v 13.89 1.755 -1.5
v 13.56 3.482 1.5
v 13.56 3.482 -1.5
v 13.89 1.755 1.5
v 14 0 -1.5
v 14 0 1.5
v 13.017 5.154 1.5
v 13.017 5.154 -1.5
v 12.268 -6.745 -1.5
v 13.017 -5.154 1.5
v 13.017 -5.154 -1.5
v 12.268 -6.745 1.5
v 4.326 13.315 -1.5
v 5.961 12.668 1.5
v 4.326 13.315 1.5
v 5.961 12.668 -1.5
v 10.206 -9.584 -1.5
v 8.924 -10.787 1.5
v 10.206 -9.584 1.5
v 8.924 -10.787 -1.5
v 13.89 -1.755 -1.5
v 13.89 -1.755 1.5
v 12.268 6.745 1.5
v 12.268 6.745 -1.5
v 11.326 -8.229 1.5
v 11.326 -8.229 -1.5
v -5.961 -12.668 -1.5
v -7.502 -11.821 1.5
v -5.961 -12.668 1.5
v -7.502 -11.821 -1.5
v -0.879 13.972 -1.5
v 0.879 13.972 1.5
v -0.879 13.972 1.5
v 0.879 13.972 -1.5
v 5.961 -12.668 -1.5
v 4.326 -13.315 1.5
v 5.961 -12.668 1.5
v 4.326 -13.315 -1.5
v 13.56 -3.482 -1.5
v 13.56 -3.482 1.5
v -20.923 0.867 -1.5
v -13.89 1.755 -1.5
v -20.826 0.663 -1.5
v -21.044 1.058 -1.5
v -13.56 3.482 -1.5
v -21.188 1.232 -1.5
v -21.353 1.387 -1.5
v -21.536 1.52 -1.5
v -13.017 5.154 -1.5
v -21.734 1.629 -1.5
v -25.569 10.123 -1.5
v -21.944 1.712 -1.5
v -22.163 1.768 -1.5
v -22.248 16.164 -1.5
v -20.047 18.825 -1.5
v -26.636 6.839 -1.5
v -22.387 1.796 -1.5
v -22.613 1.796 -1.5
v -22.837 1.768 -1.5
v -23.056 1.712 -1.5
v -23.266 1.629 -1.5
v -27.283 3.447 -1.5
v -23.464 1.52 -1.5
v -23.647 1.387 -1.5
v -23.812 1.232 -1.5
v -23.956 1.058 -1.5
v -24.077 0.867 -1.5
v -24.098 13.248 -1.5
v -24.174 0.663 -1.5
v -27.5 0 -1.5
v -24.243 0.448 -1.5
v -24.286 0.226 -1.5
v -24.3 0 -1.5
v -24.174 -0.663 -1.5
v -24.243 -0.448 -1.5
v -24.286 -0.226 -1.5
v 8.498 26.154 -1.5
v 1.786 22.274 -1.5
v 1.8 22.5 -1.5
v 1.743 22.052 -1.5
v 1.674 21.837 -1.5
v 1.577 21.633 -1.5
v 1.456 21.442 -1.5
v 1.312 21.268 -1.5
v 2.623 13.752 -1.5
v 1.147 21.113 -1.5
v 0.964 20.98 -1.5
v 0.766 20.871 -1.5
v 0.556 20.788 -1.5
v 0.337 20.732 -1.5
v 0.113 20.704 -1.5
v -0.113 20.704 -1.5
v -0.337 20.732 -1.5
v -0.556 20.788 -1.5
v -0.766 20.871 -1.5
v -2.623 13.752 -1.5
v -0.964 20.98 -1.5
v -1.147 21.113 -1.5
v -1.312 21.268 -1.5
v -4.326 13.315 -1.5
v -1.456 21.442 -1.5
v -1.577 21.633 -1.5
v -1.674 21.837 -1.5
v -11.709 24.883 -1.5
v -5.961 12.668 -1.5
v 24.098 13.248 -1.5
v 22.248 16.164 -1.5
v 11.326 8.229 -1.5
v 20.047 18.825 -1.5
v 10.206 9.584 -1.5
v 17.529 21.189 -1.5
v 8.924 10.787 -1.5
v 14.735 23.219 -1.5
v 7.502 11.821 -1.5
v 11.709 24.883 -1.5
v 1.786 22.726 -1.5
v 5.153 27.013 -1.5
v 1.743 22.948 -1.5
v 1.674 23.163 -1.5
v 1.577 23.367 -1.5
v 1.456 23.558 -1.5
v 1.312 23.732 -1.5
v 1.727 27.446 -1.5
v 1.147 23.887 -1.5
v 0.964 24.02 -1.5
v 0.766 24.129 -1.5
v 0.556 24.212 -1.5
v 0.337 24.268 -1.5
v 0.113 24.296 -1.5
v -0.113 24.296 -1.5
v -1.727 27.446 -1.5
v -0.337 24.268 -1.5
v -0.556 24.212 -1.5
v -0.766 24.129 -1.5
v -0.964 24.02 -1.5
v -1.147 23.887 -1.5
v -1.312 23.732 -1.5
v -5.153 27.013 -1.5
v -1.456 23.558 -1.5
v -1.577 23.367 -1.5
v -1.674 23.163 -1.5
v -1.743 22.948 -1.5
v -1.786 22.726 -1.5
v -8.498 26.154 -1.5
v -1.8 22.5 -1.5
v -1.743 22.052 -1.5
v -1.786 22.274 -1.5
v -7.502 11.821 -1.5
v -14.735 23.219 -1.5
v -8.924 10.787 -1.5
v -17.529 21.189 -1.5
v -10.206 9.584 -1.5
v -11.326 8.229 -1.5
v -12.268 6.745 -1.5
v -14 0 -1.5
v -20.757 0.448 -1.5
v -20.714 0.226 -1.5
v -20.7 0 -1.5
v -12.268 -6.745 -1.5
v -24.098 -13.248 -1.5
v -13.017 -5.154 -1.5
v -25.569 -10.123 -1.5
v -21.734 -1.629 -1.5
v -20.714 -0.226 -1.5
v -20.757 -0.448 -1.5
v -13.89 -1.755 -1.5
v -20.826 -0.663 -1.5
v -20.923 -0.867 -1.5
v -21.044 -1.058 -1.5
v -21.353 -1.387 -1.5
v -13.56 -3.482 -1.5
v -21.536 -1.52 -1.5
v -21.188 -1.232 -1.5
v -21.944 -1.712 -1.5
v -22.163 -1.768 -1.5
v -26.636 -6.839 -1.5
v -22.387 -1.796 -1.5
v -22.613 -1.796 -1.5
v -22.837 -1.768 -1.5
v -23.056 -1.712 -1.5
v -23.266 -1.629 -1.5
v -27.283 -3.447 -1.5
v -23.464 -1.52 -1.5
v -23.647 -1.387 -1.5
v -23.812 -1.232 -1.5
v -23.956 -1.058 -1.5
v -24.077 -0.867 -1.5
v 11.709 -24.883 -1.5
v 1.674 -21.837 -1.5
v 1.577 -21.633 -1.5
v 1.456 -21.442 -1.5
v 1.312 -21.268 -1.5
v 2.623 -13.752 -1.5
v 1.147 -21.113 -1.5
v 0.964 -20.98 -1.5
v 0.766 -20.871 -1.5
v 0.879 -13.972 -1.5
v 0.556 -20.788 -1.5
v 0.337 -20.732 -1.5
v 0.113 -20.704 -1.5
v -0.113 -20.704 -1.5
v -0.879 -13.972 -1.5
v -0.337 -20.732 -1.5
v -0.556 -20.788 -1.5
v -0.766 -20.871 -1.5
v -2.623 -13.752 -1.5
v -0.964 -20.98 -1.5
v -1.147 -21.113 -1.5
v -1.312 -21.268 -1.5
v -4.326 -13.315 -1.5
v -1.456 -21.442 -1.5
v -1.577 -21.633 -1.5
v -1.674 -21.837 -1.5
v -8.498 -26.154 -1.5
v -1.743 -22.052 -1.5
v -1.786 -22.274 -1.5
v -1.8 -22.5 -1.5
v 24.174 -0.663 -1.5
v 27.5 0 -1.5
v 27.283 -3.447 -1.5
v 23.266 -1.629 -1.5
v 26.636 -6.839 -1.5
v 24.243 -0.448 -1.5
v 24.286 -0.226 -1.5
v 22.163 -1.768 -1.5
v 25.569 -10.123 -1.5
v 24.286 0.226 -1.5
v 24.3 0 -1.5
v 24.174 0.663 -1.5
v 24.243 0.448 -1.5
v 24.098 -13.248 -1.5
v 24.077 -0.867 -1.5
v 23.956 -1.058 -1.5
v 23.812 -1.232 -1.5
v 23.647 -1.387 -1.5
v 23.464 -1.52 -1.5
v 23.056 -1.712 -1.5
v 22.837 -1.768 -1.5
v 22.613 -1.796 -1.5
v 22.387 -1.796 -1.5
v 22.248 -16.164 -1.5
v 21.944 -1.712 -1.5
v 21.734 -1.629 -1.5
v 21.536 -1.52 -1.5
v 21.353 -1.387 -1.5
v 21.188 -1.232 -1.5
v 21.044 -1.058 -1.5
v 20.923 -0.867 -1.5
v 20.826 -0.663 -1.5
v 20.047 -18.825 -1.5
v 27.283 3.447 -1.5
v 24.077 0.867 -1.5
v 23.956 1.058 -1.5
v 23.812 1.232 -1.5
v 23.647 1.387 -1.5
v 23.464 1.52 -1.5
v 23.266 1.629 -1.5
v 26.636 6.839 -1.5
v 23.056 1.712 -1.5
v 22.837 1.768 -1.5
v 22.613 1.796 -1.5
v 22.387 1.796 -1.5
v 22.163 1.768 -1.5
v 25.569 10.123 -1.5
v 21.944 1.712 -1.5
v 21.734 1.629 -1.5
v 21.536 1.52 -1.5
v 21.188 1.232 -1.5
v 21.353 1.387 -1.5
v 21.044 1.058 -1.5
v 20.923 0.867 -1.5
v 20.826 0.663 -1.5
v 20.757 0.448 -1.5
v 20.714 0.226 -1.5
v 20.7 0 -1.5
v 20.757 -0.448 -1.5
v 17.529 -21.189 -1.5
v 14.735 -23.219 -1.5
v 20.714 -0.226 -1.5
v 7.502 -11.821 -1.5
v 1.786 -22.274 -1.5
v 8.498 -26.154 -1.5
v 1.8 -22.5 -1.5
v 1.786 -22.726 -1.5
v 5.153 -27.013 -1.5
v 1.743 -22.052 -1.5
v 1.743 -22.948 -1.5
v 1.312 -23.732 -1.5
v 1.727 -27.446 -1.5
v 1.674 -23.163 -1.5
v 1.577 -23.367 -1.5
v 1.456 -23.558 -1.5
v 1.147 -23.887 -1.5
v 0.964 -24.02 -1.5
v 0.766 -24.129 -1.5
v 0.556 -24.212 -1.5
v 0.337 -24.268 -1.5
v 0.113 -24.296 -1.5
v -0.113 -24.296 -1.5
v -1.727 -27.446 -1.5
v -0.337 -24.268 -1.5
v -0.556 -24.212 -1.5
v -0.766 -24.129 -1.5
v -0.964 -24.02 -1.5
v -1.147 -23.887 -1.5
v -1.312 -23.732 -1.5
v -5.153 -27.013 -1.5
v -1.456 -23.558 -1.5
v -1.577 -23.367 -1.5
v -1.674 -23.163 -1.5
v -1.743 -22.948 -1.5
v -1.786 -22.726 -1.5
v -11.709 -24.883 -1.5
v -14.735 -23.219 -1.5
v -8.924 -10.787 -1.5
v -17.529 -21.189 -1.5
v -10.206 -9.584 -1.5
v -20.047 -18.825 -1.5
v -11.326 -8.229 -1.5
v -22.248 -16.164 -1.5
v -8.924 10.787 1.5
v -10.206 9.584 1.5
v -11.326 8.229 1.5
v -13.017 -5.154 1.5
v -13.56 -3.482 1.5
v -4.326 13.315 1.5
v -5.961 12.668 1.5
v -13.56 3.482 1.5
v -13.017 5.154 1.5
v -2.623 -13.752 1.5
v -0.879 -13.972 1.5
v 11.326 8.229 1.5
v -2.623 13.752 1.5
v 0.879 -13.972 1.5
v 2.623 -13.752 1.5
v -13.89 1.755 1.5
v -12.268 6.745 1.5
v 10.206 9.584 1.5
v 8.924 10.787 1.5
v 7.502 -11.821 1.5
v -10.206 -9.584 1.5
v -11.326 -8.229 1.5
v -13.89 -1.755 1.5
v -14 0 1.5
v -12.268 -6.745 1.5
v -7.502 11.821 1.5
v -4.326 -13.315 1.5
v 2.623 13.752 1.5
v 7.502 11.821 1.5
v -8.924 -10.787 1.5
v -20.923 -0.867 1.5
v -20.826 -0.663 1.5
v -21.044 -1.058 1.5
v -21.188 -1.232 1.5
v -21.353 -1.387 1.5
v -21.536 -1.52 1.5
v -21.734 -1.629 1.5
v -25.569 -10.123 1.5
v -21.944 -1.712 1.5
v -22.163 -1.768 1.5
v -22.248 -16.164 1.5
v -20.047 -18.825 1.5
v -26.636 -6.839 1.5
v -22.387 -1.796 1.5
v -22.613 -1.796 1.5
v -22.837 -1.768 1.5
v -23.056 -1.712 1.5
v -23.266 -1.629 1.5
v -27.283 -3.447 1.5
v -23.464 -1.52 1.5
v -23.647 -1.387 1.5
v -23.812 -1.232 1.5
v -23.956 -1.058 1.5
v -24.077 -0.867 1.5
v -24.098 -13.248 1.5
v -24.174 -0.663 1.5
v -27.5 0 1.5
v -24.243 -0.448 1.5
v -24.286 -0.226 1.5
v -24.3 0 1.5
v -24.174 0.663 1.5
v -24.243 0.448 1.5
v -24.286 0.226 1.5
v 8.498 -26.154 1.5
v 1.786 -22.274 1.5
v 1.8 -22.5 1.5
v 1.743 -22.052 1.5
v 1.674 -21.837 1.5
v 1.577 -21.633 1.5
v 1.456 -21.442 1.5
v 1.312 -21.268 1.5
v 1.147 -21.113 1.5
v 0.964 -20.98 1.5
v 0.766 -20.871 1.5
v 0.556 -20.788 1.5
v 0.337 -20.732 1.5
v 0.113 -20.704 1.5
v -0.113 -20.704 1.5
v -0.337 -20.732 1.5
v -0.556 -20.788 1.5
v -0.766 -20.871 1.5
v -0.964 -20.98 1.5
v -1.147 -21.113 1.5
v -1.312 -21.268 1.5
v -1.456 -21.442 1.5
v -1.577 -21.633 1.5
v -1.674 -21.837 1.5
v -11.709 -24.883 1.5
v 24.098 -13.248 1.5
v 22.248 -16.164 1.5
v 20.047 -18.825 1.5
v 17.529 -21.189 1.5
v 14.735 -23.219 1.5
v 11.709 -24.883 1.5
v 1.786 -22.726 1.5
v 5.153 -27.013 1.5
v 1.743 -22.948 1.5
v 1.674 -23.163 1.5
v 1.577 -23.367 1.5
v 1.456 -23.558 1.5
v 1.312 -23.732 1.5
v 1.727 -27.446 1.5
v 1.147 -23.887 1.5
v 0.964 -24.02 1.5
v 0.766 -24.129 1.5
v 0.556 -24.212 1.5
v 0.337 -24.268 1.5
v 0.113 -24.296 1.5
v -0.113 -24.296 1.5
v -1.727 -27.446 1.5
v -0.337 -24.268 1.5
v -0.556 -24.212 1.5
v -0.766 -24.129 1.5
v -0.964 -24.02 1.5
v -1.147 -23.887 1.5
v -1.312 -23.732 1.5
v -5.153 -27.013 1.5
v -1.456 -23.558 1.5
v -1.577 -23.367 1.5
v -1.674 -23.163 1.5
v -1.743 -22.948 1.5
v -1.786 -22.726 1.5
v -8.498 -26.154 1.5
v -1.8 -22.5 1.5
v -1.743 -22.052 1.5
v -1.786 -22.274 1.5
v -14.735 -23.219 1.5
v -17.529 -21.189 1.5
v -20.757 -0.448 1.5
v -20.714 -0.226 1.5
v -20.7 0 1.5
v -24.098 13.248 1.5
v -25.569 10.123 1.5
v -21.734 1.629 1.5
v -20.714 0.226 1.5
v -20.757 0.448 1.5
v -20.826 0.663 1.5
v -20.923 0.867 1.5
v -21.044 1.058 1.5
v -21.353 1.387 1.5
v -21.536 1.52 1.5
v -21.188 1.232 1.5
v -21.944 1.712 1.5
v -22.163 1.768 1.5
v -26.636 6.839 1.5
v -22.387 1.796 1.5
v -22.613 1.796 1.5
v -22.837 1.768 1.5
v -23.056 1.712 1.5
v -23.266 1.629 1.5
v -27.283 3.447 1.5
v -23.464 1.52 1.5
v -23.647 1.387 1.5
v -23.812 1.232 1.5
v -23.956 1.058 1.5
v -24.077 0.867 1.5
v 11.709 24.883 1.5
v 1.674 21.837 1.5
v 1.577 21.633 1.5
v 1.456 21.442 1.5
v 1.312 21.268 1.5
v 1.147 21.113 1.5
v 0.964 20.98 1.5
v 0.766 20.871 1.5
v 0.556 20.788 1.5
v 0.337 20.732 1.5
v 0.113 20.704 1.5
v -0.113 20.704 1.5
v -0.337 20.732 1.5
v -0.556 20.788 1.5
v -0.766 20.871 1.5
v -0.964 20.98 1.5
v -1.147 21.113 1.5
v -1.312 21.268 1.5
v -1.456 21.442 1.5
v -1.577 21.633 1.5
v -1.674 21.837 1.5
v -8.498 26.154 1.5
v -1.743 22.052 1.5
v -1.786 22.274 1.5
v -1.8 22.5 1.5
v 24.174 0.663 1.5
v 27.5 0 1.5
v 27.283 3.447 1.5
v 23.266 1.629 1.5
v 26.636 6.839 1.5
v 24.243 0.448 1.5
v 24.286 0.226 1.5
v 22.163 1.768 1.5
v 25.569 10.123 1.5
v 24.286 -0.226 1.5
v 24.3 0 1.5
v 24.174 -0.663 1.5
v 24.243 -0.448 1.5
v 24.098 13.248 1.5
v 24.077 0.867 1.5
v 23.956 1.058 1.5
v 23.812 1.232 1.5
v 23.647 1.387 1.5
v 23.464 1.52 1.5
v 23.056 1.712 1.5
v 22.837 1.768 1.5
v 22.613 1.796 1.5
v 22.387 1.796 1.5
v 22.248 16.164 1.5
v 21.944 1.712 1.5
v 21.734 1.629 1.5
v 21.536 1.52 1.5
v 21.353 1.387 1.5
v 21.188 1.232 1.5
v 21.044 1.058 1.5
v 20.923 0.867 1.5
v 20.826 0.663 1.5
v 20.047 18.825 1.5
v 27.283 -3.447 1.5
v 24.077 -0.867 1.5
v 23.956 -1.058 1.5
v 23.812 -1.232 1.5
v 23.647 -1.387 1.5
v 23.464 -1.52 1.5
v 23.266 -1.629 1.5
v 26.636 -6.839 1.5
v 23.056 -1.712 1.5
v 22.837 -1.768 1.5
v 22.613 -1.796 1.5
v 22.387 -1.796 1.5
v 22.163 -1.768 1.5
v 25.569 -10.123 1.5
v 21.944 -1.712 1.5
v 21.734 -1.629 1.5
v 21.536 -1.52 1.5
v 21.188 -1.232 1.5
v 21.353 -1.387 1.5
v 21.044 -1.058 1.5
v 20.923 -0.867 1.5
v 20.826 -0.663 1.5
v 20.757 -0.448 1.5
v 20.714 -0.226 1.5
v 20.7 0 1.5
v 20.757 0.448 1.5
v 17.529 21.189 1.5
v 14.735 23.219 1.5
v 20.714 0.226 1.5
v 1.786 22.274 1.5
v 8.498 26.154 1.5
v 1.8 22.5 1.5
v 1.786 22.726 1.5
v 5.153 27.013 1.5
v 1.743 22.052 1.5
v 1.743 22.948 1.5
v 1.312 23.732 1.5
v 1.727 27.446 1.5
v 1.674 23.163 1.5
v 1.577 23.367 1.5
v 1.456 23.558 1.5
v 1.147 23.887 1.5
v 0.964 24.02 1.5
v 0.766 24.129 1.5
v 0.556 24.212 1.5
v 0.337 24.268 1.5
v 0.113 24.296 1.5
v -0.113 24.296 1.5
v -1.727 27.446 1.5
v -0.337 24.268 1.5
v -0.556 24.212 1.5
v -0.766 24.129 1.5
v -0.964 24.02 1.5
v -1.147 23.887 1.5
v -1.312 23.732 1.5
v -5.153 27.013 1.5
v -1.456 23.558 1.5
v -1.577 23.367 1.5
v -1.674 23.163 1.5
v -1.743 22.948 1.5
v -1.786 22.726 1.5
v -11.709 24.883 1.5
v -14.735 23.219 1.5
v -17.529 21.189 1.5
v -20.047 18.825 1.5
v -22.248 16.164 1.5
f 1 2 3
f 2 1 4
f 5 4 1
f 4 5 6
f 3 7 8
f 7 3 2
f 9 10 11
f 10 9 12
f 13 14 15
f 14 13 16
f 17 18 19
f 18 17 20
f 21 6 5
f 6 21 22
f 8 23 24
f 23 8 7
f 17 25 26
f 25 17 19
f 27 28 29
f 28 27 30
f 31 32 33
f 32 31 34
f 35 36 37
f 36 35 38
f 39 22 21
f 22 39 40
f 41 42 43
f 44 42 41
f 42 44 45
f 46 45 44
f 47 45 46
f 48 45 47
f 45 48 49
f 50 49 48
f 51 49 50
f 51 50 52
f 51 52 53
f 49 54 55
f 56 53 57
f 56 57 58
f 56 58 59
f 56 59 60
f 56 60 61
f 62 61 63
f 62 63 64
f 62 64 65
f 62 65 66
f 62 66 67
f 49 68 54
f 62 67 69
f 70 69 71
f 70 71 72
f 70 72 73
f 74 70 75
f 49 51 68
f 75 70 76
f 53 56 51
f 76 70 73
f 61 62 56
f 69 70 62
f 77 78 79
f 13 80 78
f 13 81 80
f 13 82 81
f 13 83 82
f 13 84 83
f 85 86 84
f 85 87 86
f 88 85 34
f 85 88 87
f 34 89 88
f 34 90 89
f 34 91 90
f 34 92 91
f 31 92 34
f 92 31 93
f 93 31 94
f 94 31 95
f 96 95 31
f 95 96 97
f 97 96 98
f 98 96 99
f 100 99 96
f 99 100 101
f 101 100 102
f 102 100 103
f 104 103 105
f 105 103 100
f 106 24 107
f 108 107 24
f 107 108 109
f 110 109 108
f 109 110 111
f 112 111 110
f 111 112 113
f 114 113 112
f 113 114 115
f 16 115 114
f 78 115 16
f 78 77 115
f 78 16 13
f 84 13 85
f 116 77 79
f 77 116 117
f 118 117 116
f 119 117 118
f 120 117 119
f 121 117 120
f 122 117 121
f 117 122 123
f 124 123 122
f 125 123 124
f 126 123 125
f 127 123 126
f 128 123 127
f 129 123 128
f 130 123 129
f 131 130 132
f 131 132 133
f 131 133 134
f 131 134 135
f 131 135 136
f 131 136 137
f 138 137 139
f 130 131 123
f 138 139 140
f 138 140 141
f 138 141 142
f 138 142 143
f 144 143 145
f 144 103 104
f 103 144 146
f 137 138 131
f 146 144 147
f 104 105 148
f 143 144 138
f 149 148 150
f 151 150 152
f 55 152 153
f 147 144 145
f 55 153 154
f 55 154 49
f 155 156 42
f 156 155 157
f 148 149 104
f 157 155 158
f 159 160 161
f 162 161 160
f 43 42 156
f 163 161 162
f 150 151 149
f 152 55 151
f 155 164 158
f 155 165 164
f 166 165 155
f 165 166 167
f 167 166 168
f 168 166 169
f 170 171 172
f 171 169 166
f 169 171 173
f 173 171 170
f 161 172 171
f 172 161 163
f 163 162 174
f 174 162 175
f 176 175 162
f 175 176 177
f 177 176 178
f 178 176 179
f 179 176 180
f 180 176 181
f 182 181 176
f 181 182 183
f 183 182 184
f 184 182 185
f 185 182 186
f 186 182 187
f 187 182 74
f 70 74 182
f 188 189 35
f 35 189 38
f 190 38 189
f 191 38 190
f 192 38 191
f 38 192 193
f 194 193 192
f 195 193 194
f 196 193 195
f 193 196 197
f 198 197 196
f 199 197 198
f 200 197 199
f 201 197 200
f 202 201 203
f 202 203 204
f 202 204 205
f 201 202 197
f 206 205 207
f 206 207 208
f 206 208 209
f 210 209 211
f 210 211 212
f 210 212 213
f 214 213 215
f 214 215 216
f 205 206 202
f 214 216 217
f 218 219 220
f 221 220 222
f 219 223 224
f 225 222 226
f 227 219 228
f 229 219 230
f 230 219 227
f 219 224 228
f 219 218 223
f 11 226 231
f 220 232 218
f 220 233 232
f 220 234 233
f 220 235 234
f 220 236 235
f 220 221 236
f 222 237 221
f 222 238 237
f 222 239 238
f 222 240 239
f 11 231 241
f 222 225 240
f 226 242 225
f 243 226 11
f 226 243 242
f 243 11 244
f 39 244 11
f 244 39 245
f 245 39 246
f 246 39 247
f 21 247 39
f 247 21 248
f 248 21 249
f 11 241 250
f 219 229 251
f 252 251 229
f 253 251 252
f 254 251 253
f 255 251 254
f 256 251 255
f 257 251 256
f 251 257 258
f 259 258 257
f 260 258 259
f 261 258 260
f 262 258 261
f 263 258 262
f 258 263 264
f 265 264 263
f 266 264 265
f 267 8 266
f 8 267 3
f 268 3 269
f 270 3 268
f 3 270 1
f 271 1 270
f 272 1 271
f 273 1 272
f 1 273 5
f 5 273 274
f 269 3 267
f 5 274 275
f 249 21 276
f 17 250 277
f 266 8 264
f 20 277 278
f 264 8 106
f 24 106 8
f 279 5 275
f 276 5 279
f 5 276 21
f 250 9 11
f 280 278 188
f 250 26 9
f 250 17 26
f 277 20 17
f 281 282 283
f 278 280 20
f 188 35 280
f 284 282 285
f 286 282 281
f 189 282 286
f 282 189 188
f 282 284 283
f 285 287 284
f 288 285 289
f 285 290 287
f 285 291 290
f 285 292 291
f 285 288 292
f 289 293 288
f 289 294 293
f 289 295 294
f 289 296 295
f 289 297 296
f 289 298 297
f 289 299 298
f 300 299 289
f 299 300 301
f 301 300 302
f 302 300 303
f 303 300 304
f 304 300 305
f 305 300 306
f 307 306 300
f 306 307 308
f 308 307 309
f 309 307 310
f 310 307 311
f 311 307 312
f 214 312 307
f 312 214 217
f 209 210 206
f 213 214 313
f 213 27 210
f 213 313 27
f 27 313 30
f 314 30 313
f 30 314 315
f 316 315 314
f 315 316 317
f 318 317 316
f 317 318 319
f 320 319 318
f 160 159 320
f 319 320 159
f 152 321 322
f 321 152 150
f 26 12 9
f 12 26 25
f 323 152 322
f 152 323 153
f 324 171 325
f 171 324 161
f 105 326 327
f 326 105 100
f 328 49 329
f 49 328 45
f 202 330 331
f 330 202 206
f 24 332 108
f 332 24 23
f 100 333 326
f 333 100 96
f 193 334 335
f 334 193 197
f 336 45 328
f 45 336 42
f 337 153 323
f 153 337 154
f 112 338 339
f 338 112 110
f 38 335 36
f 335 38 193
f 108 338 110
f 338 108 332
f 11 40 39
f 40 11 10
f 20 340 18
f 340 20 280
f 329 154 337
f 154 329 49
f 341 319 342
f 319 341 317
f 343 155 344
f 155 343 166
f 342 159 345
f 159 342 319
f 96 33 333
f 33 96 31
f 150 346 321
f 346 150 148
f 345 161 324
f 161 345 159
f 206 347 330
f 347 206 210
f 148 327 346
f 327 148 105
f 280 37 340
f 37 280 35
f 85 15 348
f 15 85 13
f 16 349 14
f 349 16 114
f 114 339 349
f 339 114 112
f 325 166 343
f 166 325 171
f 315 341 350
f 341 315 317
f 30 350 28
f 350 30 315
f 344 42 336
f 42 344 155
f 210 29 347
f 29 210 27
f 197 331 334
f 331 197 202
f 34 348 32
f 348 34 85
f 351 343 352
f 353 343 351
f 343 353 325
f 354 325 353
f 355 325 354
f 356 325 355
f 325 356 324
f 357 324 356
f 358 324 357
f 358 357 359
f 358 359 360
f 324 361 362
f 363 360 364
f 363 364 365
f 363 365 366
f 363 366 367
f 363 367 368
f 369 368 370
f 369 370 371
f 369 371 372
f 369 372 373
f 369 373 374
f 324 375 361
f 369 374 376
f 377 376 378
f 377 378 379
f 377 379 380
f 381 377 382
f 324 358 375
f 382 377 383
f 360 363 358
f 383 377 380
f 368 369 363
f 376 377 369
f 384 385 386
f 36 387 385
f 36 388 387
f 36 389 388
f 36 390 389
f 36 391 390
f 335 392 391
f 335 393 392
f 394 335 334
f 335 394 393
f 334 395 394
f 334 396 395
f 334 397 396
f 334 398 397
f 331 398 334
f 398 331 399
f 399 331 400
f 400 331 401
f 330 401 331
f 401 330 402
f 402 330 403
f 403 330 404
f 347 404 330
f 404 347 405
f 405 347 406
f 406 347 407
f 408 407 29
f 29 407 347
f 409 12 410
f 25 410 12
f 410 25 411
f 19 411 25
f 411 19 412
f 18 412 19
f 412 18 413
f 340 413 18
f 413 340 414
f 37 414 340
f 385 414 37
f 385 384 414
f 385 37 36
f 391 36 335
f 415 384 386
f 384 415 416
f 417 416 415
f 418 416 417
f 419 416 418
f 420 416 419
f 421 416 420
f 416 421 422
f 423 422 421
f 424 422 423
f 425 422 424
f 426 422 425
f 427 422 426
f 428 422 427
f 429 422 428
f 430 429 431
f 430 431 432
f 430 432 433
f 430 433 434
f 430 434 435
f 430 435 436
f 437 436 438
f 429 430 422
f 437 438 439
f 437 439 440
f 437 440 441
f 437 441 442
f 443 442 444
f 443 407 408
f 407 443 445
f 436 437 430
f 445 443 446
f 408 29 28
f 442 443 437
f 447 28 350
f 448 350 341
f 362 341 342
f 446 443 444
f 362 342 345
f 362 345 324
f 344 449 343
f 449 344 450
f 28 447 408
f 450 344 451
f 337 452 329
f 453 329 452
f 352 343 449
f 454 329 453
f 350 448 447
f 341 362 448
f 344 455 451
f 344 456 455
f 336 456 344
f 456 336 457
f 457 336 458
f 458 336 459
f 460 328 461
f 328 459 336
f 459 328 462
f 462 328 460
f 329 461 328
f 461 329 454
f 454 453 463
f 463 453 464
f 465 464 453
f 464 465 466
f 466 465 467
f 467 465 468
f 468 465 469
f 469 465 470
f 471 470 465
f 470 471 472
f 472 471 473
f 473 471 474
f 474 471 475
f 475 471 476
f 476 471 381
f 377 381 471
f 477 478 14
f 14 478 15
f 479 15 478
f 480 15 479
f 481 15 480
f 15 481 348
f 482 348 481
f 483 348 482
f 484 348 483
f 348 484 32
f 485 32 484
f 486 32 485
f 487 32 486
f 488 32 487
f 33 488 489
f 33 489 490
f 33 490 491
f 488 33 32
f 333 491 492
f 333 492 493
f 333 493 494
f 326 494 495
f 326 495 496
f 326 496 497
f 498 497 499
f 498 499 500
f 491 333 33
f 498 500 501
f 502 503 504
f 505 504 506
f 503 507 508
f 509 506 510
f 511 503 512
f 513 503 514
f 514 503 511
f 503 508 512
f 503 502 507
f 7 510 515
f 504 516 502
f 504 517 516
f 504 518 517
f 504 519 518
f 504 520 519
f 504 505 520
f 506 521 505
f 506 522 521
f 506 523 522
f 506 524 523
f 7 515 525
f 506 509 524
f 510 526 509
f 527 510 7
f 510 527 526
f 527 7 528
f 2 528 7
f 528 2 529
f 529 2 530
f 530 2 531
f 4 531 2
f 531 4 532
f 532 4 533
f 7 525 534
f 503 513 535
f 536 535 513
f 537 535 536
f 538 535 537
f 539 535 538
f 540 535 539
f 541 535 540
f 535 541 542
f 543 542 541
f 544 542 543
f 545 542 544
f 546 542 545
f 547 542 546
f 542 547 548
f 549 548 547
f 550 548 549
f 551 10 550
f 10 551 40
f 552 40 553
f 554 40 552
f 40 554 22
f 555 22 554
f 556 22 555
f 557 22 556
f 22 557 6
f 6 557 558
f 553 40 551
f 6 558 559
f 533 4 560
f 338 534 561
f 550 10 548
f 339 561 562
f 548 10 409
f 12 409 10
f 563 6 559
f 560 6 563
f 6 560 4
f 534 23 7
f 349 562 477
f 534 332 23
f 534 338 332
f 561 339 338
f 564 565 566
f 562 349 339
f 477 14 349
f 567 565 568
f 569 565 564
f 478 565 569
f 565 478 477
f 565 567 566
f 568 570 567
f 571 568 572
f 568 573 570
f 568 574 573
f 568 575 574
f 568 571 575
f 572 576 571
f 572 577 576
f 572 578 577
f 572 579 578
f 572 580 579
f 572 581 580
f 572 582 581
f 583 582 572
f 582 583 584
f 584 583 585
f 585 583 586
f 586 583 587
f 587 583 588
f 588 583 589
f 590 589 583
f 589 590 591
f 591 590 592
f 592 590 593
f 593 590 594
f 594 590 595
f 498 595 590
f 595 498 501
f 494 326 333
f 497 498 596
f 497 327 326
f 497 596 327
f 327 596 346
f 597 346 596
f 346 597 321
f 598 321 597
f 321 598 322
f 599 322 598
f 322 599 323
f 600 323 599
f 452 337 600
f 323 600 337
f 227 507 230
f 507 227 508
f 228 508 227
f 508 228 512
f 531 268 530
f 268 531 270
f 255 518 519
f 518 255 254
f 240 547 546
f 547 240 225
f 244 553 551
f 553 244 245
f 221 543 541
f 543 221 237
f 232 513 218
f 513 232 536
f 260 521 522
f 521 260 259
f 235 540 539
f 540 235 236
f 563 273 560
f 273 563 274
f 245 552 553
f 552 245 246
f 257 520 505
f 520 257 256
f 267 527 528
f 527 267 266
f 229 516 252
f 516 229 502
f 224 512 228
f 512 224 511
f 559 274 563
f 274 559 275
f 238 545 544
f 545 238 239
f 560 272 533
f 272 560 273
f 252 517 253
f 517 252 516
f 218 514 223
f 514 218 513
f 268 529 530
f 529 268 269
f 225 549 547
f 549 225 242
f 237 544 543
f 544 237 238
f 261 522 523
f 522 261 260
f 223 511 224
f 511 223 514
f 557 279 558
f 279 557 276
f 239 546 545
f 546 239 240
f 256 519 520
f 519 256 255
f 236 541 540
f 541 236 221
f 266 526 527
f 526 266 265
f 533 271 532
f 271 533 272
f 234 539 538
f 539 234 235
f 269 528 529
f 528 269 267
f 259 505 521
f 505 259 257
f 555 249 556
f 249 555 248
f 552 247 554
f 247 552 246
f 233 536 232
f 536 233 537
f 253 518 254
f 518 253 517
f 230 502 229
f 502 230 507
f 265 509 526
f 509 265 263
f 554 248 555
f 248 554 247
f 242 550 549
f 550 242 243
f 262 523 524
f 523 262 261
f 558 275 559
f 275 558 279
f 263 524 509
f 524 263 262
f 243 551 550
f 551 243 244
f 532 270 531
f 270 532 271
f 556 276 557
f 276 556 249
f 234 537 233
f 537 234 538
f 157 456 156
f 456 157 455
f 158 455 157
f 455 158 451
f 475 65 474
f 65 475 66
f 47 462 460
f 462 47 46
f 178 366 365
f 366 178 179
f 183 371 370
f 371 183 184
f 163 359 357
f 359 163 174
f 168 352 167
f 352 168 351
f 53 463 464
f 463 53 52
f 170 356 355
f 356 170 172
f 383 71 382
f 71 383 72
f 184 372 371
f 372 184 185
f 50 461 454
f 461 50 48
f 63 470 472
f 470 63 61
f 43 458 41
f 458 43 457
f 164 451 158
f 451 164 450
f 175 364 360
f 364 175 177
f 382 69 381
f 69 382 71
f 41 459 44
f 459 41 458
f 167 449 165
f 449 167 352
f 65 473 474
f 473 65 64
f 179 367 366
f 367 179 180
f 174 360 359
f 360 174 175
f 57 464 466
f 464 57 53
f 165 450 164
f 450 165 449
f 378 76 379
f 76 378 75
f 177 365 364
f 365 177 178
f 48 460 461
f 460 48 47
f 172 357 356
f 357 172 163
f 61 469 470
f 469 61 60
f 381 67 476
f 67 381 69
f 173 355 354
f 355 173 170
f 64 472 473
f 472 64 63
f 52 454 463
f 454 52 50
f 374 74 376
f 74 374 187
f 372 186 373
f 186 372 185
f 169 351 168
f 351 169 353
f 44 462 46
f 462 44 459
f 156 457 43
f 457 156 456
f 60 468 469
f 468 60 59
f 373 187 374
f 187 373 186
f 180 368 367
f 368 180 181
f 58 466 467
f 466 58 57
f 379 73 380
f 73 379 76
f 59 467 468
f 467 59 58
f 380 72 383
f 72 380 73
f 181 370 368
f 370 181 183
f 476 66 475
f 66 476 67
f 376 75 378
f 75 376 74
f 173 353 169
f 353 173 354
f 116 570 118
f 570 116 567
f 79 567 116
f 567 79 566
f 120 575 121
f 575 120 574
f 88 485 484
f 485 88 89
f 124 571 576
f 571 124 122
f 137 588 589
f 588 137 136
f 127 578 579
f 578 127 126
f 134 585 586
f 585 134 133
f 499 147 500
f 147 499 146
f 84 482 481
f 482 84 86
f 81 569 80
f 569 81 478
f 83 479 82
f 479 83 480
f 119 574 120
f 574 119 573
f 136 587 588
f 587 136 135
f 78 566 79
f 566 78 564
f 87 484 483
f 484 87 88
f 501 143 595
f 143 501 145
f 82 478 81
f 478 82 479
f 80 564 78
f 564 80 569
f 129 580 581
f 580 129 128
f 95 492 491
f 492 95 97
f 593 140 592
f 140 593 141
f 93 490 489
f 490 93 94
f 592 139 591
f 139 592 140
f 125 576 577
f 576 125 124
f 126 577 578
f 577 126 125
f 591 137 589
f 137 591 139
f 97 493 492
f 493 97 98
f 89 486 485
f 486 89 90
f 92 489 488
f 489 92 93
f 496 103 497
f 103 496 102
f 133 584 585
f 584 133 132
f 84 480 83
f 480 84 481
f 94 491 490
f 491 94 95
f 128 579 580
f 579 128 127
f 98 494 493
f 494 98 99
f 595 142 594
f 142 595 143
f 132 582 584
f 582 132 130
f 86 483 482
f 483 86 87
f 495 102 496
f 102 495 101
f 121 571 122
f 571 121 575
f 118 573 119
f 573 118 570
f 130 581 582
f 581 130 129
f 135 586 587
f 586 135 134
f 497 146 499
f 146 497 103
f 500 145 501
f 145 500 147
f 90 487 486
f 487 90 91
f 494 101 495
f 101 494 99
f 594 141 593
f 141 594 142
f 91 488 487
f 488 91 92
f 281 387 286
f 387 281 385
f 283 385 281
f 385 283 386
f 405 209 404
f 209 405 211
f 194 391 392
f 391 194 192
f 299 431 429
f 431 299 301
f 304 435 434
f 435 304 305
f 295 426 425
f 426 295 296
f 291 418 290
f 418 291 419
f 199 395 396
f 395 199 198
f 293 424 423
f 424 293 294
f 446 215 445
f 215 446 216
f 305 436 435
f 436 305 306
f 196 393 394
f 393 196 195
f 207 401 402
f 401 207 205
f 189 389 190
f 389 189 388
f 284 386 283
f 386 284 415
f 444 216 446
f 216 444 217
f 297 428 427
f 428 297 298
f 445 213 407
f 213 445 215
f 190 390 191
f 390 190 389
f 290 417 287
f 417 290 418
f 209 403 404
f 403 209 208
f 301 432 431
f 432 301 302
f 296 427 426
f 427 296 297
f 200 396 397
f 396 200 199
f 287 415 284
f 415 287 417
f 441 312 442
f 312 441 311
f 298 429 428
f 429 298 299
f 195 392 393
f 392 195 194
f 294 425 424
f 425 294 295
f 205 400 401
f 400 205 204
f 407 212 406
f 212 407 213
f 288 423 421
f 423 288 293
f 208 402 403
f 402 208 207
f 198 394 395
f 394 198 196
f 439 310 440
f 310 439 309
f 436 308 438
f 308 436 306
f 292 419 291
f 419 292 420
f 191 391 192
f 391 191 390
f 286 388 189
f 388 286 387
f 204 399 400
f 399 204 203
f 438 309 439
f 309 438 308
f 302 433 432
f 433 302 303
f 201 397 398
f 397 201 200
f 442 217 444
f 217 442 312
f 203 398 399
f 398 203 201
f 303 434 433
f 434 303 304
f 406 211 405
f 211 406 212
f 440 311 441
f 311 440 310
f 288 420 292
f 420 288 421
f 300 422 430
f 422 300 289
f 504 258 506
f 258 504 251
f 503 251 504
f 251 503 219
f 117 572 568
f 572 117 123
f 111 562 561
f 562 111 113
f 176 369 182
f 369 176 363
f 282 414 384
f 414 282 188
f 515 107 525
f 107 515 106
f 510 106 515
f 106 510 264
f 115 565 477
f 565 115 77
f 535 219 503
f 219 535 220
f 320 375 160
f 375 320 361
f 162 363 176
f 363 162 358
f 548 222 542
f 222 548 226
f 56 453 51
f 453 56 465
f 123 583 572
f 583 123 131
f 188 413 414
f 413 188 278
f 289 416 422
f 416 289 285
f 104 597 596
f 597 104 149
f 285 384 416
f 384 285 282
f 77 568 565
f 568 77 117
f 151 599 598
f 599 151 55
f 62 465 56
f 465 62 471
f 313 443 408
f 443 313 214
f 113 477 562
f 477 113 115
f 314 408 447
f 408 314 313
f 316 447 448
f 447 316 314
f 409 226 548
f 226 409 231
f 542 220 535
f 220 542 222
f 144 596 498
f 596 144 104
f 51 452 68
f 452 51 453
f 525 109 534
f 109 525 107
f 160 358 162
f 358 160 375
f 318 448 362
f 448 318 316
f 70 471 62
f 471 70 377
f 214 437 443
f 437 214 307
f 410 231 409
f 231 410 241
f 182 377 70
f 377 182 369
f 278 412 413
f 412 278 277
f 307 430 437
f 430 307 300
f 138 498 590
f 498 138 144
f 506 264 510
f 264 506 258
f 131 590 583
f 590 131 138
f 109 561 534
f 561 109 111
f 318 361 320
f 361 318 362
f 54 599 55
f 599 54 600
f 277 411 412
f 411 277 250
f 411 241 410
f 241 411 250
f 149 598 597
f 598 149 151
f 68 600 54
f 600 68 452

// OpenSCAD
$fn = 50;


difference() {
	union() {
		translate(v = [0, 0, -1.5000000000]) {
			cylinder(h = 3, r = 27.5000000000);
		}
	}
	union() {
		translate(v = [0, 0, -1.5000000000]) {
			cylinder(h = 3, r = 14.0000000000);
		}
		translate(v = [22.5000000000, 0, -47.0000000000]) {
			cylinder(h = 100, r = 1.8000000000);
		}
		translate(v = [-22.5000000000, 0, -47.0000000000]) {
			cylinder(h = 100, r = 1.8000000000);
		}
		translate(v = [0, 22.5000000000, -47.0000000000]) {
			cylinder(h = 100, r = 1.8000000000);
		}
		translate(v = [0, -22.5000000000, -47.0000000000]) {
			cylinder(h = 100, r = 1.8000000000);
		}
	}
}
